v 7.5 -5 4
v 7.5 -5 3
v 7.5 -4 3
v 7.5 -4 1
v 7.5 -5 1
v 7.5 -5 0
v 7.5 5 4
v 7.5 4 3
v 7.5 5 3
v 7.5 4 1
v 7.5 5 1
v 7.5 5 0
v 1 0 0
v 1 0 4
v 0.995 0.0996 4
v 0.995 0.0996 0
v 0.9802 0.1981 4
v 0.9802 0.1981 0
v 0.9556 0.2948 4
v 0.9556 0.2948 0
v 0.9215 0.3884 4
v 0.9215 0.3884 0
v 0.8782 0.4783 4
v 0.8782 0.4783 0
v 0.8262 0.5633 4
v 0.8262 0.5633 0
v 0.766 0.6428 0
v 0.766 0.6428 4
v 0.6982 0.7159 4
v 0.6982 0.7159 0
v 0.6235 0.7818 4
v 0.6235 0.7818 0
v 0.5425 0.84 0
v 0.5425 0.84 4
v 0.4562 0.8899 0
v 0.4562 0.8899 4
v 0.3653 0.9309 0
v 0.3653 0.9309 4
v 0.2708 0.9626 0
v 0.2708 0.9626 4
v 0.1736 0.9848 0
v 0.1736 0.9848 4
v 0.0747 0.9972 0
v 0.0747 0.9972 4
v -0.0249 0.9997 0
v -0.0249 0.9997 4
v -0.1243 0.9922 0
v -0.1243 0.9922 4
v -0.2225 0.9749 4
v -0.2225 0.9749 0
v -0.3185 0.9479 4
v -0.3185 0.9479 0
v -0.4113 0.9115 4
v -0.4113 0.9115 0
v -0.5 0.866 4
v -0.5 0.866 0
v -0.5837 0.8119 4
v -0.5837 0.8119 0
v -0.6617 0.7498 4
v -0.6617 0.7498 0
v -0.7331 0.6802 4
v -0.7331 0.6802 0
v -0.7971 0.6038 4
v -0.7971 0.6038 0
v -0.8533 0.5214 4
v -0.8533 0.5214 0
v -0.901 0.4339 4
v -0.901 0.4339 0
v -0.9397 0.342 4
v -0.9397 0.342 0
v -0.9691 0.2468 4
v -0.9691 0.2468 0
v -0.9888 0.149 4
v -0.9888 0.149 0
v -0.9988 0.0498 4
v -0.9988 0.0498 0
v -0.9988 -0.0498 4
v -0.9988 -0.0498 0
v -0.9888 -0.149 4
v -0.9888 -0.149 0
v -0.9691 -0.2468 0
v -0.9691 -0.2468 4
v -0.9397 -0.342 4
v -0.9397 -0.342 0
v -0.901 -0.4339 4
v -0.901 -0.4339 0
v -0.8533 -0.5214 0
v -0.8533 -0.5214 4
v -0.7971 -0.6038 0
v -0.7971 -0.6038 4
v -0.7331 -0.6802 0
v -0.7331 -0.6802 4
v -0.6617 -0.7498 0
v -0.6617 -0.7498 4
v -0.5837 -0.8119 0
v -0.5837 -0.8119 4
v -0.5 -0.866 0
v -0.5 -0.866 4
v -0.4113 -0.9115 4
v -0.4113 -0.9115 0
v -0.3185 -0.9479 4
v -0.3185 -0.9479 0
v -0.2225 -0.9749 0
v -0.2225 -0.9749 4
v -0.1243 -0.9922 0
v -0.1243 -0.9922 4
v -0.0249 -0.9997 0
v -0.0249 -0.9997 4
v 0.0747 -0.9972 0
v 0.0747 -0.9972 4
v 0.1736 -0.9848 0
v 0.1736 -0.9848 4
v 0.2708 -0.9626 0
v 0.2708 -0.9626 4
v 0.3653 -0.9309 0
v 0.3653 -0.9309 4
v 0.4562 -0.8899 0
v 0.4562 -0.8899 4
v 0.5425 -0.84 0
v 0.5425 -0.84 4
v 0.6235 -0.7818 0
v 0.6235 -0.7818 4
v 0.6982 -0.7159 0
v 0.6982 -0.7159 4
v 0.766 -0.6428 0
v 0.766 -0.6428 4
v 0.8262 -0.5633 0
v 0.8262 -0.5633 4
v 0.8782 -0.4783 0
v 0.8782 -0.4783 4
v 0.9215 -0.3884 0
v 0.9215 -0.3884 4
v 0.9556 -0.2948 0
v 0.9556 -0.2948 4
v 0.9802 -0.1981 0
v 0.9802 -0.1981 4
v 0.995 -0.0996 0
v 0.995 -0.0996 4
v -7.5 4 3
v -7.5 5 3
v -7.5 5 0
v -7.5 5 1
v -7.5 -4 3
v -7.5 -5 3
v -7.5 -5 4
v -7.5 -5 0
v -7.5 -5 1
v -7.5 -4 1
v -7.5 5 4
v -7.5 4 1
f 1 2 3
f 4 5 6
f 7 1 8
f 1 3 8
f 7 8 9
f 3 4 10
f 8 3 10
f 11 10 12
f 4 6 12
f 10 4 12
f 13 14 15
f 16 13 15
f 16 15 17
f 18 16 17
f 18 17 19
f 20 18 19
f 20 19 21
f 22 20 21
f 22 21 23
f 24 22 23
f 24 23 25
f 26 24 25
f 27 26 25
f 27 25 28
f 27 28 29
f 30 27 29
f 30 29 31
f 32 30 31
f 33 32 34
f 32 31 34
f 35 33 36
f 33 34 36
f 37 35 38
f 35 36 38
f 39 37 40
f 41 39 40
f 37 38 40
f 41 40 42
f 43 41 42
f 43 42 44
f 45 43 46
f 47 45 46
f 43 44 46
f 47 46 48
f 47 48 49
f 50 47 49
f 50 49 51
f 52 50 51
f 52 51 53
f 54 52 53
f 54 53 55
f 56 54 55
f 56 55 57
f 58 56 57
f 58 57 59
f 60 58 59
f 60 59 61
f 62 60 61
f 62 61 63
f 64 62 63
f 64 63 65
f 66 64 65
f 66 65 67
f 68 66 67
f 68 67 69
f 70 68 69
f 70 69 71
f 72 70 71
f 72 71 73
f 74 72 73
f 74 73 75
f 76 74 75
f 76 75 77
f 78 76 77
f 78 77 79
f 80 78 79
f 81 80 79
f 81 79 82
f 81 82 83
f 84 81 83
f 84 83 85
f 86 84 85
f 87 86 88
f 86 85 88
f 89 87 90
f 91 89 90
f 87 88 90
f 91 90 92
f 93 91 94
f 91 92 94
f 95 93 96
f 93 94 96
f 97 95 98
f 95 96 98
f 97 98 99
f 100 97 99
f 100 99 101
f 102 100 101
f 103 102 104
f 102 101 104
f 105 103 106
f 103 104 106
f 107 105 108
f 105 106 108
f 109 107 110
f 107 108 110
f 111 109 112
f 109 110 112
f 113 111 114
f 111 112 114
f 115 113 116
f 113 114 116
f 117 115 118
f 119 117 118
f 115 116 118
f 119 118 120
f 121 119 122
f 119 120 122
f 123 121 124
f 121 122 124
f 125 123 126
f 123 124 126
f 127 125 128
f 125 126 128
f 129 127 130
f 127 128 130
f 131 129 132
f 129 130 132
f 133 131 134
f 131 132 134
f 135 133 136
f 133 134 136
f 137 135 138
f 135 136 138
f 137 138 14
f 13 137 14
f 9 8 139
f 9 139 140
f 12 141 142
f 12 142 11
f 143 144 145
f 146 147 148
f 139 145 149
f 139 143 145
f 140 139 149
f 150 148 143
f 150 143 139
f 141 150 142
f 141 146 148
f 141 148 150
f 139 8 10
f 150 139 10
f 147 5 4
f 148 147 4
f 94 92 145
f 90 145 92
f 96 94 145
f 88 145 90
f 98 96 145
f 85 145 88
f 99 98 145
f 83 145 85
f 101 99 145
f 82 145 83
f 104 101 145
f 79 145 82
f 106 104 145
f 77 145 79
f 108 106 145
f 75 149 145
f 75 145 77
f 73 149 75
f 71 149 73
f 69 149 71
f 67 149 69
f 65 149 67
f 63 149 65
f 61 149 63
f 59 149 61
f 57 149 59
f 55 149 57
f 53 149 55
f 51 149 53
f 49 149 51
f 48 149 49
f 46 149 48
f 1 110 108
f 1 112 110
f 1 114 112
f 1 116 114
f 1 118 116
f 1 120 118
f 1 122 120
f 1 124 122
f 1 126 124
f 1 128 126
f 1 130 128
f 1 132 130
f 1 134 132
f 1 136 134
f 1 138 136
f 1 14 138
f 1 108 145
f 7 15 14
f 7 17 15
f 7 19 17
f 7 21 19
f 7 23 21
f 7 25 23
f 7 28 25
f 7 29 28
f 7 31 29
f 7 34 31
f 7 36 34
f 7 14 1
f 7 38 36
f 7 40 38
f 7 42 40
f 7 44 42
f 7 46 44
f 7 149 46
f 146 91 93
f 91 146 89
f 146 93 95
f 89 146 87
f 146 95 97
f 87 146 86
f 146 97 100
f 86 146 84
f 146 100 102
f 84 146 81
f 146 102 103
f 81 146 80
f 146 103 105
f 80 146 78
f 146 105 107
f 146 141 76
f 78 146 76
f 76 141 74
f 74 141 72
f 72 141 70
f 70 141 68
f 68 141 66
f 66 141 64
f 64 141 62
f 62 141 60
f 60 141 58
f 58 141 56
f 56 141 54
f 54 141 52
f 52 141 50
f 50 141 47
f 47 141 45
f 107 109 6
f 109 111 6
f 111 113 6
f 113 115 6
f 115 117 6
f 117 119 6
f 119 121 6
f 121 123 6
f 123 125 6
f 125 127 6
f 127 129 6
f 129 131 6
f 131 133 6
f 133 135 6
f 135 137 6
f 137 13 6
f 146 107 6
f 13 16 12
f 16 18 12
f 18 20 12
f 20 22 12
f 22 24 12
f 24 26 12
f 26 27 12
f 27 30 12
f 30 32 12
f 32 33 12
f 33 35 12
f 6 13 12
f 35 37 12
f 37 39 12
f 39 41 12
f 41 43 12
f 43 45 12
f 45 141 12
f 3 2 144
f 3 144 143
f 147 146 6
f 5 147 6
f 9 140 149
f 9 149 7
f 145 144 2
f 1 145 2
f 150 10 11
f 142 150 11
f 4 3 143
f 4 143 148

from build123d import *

# Parameters (mm, degrees)
SKETCH_1_W          = 15
SKETCH_1_H          = 10
EXTRUDE_1_DEPTH     = 4
SKETCH_2_W          = 2
SKETCH_2_H          = 1
CUT_EXTRUDE_1_DEPTH = 16
SKETCH_3_R          = 1
CUT_EXTRUDE_2_DEPTH = 5


with BuildPart() as part:
    # 草图1 → 凸台-拉伸1 (new body)
    with BuildSketch(Plane.XY):
        Rectangle(SKETCH_1_W, SKETCH_1_H)
    extrude(amount=EXTRUDE_1_DEPTH)

    # 草图2 → 切除-拉伸1 (cut, through all)
    with BuildSketch(Plane(origin=(7.5, 0, 0), x_dir=(0, 0, -1), z_dir=(1, 0, 0))):
        with Locations((-2, 4.5)):
            Rectangle(SKETCH_2_W, SKETCH_2_H)
        with Locations((-2, -4.5)):
            Rectangle(SKETCH_2_W, SKETCH_2_H)
    extrude(amount=-CUT_EXTRUDE_1_DEPTH, mode=Mode.SUBTRACT)

    # 草图3 → 切除-拉伸2 (cut, through all)
    with BuildSketch(Plane.XY.offset(4)):
        Circle(SKETCH_3_R)
    extrude(amount=-CUT_EXTRUDE_2_DEPTH, mode=Mode.SUBTRACT)


solid = part.part
